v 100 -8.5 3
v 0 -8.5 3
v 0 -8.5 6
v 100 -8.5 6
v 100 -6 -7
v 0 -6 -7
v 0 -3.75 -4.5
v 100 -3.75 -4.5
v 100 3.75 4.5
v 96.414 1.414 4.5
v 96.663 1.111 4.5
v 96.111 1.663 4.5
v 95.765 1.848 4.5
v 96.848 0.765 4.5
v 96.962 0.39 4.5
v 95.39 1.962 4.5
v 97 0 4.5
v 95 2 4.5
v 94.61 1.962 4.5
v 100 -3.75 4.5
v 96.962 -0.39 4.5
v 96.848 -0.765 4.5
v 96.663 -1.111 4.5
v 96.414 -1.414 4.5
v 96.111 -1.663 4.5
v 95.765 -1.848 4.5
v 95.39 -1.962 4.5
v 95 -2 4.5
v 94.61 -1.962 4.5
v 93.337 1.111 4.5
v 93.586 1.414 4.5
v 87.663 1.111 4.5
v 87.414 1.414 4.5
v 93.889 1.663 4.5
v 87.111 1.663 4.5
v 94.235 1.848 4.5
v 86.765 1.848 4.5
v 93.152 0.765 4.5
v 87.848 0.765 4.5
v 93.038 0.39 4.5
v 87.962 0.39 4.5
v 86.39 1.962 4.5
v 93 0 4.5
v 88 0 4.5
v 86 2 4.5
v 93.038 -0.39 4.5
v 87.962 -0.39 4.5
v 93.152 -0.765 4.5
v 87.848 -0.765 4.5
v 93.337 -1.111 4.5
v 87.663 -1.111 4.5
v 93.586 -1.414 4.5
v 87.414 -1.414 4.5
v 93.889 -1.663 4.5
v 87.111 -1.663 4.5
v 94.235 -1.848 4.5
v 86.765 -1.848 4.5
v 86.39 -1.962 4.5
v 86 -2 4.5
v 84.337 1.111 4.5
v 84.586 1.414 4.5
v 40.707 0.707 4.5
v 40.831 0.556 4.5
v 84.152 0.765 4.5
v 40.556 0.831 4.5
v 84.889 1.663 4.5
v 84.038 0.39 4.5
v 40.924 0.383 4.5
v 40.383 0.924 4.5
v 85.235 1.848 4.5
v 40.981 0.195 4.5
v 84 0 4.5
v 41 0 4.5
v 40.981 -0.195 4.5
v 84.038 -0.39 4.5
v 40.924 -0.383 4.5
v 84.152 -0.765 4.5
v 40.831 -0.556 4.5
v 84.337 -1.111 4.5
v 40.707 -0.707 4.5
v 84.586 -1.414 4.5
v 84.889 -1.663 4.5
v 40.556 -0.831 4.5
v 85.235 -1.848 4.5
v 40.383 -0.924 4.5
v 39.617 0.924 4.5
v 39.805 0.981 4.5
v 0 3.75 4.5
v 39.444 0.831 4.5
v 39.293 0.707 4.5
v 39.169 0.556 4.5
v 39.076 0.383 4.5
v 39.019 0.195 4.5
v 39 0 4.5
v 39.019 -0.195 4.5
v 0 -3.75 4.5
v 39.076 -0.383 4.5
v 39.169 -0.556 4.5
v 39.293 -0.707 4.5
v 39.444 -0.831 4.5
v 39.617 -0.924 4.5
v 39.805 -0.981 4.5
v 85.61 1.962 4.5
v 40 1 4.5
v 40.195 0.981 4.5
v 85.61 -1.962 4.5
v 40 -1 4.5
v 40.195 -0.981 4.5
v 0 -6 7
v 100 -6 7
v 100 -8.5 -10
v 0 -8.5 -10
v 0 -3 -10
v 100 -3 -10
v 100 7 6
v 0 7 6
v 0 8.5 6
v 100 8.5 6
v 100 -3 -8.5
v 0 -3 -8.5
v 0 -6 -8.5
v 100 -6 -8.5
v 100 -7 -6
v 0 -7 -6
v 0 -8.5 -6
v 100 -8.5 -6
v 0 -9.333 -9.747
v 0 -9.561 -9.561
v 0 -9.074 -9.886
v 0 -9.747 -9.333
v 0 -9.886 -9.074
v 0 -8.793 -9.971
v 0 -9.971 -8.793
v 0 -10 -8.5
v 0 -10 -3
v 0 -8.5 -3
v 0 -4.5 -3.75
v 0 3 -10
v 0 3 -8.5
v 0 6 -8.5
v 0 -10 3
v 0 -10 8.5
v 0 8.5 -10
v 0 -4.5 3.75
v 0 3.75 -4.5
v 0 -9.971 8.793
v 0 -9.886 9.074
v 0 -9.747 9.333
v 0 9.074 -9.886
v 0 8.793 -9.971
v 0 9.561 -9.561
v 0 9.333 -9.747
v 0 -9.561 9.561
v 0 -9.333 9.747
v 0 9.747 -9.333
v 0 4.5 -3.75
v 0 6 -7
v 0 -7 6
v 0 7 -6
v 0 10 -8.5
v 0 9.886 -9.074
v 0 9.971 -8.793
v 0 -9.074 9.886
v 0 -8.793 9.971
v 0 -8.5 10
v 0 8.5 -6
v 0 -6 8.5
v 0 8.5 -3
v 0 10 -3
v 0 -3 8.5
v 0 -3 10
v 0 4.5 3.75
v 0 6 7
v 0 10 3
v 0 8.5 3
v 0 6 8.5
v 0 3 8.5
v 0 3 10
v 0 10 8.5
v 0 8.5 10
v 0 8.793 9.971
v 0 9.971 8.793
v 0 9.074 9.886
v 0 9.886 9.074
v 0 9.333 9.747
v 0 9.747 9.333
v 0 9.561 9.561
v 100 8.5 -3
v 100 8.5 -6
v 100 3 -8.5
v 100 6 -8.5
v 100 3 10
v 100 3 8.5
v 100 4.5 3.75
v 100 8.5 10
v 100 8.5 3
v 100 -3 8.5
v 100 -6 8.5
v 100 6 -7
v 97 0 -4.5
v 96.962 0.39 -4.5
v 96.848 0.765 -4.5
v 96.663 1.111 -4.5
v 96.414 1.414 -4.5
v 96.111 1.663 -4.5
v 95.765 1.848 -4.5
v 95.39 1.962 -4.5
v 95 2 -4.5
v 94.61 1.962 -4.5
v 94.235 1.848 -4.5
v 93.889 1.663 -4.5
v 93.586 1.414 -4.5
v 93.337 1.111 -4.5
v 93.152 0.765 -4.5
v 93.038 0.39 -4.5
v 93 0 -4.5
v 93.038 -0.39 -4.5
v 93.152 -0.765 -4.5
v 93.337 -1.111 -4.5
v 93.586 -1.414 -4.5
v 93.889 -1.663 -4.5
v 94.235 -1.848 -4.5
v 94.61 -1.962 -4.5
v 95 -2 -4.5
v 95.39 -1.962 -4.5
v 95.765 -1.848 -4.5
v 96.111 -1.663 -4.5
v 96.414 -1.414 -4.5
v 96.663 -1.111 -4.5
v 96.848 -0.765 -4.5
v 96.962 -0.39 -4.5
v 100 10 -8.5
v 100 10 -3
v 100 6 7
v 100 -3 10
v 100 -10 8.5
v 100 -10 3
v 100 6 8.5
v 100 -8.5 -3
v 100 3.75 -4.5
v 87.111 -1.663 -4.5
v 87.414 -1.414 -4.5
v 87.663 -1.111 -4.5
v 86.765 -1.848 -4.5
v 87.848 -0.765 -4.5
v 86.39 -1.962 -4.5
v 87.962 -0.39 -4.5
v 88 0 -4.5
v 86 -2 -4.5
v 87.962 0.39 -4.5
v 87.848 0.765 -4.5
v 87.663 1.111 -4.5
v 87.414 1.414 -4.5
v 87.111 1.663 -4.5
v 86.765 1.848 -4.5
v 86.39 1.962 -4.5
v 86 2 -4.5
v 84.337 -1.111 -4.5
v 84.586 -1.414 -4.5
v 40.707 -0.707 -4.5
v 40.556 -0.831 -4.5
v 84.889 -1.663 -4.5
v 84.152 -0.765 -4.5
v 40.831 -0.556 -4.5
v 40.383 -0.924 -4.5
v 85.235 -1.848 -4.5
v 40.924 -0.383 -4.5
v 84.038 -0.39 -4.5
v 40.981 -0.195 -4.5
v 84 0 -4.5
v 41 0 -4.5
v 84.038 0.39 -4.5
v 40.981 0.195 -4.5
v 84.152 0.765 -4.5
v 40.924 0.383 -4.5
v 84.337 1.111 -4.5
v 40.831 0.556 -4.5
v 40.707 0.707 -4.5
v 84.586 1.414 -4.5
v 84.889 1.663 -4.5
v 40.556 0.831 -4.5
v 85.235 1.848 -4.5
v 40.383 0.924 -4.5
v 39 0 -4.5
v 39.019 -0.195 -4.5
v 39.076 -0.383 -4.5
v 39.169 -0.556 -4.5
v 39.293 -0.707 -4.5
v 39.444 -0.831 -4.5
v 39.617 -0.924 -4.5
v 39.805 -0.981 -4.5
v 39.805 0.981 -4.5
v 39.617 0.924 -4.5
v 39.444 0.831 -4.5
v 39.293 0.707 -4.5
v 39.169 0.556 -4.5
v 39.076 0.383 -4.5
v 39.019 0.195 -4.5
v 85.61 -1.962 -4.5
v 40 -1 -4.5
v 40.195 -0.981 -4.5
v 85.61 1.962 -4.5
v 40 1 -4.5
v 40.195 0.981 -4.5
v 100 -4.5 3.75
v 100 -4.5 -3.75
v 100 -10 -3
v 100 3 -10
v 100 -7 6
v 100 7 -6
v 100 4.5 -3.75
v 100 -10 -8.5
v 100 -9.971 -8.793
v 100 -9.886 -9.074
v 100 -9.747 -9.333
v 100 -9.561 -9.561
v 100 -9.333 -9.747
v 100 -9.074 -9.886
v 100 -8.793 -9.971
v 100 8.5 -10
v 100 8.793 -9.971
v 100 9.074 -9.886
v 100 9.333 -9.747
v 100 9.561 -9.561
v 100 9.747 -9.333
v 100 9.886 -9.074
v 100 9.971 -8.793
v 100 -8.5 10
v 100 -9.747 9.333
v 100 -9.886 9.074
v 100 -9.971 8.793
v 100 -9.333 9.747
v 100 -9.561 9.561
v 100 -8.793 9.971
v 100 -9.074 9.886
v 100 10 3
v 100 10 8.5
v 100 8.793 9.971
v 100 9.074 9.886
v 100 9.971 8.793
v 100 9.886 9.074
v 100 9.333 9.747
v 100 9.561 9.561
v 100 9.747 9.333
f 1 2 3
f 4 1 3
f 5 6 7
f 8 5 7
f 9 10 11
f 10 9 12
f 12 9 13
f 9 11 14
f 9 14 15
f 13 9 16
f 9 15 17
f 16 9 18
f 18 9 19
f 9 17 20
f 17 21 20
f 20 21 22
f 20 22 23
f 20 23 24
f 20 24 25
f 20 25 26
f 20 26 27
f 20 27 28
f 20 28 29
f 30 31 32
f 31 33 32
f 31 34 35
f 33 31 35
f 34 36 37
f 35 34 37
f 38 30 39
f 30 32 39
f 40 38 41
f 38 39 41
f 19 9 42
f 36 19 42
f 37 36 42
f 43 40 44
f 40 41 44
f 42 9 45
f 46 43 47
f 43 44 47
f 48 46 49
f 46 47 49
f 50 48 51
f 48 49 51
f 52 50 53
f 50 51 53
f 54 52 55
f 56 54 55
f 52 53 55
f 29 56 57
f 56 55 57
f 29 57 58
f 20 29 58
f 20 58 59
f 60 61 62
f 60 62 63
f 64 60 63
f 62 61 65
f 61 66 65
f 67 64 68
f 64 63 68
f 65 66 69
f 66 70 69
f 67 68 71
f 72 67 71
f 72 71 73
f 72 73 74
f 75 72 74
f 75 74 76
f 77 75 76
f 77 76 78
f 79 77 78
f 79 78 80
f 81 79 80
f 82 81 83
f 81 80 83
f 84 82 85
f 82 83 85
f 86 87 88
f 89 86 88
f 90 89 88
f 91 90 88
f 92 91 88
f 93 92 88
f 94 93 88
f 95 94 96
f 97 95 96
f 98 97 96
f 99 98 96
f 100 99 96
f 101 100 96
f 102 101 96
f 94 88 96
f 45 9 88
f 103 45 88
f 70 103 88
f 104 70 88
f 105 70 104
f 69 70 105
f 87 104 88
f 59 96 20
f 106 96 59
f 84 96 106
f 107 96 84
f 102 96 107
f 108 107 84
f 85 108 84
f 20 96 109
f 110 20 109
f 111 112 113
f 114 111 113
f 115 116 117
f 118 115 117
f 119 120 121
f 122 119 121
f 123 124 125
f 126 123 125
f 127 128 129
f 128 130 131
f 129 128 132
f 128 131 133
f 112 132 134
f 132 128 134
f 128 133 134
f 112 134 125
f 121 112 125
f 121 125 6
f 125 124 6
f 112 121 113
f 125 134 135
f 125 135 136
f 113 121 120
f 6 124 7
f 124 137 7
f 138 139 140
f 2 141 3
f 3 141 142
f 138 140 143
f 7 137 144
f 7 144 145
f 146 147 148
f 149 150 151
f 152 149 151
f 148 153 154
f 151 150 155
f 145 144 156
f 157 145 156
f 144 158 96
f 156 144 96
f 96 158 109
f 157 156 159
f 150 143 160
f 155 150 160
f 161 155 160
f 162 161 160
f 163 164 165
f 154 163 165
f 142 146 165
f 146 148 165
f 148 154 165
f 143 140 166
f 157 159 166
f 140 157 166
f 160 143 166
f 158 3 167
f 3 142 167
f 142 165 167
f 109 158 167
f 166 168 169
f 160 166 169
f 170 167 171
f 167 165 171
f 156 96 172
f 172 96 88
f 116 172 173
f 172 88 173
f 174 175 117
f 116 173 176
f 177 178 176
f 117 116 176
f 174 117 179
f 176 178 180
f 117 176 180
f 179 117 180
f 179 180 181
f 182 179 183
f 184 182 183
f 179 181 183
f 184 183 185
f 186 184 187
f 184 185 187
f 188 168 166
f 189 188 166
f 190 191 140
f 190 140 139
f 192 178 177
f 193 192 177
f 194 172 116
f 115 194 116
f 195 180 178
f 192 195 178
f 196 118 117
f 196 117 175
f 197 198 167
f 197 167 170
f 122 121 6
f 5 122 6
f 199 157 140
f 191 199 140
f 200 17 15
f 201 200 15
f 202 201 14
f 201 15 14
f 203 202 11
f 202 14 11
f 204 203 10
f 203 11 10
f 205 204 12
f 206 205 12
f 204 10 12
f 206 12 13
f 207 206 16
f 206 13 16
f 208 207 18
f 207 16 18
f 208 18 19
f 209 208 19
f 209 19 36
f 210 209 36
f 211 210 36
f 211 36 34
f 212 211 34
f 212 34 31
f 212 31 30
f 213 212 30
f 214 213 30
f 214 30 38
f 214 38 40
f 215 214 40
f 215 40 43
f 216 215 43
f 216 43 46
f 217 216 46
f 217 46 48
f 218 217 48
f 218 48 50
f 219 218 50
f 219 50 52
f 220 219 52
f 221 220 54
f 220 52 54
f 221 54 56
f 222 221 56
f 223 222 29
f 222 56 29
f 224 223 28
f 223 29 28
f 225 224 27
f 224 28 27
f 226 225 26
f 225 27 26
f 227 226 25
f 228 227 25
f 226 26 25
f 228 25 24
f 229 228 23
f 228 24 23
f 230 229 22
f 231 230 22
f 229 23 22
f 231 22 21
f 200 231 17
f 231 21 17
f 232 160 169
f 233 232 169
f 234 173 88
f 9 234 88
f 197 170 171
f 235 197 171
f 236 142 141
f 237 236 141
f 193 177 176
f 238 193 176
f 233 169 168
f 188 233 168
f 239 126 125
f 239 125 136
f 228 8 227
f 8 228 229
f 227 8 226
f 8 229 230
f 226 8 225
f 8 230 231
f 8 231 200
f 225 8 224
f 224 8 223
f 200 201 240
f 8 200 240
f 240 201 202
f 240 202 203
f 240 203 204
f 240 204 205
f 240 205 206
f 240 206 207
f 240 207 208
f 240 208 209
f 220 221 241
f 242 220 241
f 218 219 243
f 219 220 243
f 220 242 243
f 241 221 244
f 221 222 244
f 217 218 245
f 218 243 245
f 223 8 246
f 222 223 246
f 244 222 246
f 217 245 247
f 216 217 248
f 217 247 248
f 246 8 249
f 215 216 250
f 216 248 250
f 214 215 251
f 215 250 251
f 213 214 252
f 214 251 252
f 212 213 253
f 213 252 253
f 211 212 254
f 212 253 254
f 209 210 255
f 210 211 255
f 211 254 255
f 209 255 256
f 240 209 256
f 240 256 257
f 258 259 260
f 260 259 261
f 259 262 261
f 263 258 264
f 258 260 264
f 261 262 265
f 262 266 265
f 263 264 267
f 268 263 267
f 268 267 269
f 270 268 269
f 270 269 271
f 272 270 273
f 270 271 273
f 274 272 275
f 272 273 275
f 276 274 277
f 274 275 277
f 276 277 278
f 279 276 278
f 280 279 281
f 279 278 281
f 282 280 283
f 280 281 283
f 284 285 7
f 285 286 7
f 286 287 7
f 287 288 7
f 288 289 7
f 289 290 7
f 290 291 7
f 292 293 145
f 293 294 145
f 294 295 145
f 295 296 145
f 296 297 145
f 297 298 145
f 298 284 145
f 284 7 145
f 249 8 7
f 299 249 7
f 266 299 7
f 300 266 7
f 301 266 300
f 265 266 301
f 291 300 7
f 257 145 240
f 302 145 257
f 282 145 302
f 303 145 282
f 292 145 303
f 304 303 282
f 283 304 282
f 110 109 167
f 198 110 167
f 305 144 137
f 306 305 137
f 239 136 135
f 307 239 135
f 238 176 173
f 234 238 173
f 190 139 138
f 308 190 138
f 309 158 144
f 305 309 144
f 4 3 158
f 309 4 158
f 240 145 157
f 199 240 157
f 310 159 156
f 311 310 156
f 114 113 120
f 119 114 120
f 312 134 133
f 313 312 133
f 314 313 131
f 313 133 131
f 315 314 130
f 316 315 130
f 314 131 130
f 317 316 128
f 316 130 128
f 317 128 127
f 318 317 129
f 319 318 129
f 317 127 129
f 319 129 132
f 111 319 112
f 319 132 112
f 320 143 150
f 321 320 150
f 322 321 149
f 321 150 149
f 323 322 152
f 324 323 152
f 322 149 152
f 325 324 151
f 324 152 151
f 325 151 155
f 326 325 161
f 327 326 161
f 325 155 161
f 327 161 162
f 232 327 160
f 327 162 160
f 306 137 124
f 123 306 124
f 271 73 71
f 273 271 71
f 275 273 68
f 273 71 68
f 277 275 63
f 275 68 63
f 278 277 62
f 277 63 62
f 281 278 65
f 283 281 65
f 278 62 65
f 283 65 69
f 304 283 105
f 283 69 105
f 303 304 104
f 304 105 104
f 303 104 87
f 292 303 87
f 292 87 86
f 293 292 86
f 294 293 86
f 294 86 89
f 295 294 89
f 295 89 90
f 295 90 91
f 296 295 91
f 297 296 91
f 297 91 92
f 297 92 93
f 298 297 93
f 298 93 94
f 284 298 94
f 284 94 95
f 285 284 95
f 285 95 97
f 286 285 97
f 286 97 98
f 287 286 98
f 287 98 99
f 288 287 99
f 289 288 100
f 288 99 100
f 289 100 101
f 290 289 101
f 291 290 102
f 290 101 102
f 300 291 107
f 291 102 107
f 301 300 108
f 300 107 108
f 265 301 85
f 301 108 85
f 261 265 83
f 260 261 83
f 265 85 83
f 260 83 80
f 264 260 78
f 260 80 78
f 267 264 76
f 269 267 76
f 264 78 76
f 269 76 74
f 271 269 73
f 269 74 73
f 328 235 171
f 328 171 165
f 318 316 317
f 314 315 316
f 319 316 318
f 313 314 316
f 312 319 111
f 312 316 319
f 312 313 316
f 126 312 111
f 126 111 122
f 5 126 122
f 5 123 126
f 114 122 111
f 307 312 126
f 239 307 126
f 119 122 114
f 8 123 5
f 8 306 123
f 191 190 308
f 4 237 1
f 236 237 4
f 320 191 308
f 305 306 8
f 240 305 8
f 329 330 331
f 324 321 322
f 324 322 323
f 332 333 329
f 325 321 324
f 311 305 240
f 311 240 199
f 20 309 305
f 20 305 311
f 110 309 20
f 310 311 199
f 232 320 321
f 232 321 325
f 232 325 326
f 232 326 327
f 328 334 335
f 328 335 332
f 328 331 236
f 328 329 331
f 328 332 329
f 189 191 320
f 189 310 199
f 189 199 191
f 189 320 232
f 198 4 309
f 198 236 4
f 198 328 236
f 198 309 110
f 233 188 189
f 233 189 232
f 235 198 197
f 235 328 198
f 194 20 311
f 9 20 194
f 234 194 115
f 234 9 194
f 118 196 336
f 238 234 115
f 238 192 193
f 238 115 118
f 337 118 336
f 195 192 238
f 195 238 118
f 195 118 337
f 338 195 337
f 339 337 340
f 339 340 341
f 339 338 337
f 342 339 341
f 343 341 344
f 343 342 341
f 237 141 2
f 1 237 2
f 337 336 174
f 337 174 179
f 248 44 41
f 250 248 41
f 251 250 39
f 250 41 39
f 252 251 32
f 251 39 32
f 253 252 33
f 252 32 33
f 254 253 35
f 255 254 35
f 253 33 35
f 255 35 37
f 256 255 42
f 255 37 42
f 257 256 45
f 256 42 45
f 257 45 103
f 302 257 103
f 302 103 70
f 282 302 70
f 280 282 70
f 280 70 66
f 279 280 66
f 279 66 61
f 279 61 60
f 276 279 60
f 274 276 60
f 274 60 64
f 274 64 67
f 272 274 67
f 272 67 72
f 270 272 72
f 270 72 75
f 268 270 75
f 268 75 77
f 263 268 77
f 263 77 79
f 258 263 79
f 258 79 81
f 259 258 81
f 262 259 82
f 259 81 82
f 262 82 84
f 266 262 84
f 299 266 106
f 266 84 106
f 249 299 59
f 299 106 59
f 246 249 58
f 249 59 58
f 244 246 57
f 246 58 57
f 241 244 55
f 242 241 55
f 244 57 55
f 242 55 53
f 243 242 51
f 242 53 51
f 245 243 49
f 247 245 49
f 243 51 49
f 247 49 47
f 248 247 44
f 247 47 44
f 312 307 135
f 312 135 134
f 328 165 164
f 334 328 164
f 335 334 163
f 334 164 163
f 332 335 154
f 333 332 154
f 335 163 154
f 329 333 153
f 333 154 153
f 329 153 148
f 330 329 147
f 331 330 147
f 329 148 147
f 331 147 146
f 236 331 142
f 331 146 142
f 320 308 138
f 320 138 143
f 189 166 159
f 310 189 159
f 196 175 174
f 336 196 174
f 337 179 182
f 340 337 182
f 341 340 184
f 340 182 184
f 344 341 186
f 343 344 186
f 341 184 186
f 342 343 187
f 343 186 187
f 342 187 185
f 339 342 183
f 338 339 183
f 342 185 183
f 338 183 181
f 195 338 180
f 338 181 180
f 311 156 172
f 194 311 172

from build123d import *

# Parameters (mm, degrees)
F1_DEPTH = 100
F2_R     = 2
F2_R_2   = 1
F3_DEPTH = 14.501


with BuildPart() as f1:
    # F0 (on Right) → F1 (new body)
    with BuildSketch(Plane.YZ):
        with BuildLine():
            ThreePointArc((10, 8.5), (9.56066, 9.56066), (8.5, 10))
            Line((8.5, 10), (3, 10))
            Line((3, 10), (3, 8.5))
            Line((3, 8.5), (6, 8.5))
            Line((6, 8.5), (6, 7))
            Line((6, 7), (3.75, 4.5))
            Line((3.75, 4.5), (0, 4.5))
            Line((0, 4.5), (-3.75, 4.5))
            Line((-3.75, 4.5), (-6, 7))
            Line((-6, 7), (-6, 8.5))
            Line((-6, 8.5), (-3, 8.5))
            Line((-3, 8.5), (-3, 10))
            Line((-3, 10), (-8.5, 10))
            ThreePointArc((-8.5, 10), (-9.56066, 9.56066), (-10, 8.5))
            Line((-10, 8.5), (-10, 3))
            Line((-10, 3), (-8.5, 3))
            Line((-8.5, 3), (-8.5, 6))
            Line((-8.5, 6), (-7, 6))
            Line((-7, 6), (-4.5, 3.75))
            Line((-4.5, 3.75), (-4.5, 0))
            Line((-4.5, 0), (-4.5, -3.75))
            Line((-4.5, -3.75), (-7, -6))
            Line((-7, -6), (-8.5, -6))
            Line((-8.5, -6), (-8.5, -3))
            Line((-8.5, -3), (-10, -3))
            Line((-10, -3), (-10, -8.5))
            ThreePointArc((-10, -8.5), (-9.56066, -9.56066), (-8.5, -10))
            Line((-8.5, -10), (-3, -10))
            Line((-3, -10), (-3, -8.5))
            Line((-3, -8.5), (-6, -8.5))
            Line((-6, -8.5), (-6, -7))
            Line((-6, -7), (-3.75, -4.5))
            Line((-3.75, -4.5), (0, -4.5))
            Line((0, -4.5), (3.75, -4.5))
            Line((3.75, -4.5), (6, -7))
            Line((6, -7), (6, -8.5))
            Line((6, -8.5), (3, -8.5))
            Line((3, -8.5), (3, -10))
            Line((3, -10), (8.5, -10))
            ThreePointArc((8.5, -10), (9.56066, -9.56066), (10, -8.5))
            Line((10, -8.5), (10, -3))
            Line((10, -3), (8.5, -3))
            Line((8.5, -3), (8.5, -6))
            Line((8.5, -6), (7, -6))
            Line((7, -6), (4.5, -3.75))
            Line((4.5, -3.75), (4.5, 0))
            Line((4.5, 0), (4.5, 3.75))
            Line((4.5, 3.75), (7, 6))
            Line((7, 6), (8.5, 6))
            Line((8.5, 6), (8.5, 3))
            Line((8.5, 3), (10, 3))
            Line((10, 3), (10, 8.5))
        make_face()
    extrude(amount=F1_DEPTH)

    # F2 (on face) → F3 (cut, through all)
    with BuildSketch(Plane.XY.offset(4.5)):
        with Locations((86, 0)):
            Circle(F2_R)
        with Locations((95, 0)):
            Circle(F2_R)
        with Locations((40, 0)):
            Circle(F2_R_2)
    extrude(amount=-F3_DEPTH, mode=Mode.SUBTRACT)


solid = f1.part
